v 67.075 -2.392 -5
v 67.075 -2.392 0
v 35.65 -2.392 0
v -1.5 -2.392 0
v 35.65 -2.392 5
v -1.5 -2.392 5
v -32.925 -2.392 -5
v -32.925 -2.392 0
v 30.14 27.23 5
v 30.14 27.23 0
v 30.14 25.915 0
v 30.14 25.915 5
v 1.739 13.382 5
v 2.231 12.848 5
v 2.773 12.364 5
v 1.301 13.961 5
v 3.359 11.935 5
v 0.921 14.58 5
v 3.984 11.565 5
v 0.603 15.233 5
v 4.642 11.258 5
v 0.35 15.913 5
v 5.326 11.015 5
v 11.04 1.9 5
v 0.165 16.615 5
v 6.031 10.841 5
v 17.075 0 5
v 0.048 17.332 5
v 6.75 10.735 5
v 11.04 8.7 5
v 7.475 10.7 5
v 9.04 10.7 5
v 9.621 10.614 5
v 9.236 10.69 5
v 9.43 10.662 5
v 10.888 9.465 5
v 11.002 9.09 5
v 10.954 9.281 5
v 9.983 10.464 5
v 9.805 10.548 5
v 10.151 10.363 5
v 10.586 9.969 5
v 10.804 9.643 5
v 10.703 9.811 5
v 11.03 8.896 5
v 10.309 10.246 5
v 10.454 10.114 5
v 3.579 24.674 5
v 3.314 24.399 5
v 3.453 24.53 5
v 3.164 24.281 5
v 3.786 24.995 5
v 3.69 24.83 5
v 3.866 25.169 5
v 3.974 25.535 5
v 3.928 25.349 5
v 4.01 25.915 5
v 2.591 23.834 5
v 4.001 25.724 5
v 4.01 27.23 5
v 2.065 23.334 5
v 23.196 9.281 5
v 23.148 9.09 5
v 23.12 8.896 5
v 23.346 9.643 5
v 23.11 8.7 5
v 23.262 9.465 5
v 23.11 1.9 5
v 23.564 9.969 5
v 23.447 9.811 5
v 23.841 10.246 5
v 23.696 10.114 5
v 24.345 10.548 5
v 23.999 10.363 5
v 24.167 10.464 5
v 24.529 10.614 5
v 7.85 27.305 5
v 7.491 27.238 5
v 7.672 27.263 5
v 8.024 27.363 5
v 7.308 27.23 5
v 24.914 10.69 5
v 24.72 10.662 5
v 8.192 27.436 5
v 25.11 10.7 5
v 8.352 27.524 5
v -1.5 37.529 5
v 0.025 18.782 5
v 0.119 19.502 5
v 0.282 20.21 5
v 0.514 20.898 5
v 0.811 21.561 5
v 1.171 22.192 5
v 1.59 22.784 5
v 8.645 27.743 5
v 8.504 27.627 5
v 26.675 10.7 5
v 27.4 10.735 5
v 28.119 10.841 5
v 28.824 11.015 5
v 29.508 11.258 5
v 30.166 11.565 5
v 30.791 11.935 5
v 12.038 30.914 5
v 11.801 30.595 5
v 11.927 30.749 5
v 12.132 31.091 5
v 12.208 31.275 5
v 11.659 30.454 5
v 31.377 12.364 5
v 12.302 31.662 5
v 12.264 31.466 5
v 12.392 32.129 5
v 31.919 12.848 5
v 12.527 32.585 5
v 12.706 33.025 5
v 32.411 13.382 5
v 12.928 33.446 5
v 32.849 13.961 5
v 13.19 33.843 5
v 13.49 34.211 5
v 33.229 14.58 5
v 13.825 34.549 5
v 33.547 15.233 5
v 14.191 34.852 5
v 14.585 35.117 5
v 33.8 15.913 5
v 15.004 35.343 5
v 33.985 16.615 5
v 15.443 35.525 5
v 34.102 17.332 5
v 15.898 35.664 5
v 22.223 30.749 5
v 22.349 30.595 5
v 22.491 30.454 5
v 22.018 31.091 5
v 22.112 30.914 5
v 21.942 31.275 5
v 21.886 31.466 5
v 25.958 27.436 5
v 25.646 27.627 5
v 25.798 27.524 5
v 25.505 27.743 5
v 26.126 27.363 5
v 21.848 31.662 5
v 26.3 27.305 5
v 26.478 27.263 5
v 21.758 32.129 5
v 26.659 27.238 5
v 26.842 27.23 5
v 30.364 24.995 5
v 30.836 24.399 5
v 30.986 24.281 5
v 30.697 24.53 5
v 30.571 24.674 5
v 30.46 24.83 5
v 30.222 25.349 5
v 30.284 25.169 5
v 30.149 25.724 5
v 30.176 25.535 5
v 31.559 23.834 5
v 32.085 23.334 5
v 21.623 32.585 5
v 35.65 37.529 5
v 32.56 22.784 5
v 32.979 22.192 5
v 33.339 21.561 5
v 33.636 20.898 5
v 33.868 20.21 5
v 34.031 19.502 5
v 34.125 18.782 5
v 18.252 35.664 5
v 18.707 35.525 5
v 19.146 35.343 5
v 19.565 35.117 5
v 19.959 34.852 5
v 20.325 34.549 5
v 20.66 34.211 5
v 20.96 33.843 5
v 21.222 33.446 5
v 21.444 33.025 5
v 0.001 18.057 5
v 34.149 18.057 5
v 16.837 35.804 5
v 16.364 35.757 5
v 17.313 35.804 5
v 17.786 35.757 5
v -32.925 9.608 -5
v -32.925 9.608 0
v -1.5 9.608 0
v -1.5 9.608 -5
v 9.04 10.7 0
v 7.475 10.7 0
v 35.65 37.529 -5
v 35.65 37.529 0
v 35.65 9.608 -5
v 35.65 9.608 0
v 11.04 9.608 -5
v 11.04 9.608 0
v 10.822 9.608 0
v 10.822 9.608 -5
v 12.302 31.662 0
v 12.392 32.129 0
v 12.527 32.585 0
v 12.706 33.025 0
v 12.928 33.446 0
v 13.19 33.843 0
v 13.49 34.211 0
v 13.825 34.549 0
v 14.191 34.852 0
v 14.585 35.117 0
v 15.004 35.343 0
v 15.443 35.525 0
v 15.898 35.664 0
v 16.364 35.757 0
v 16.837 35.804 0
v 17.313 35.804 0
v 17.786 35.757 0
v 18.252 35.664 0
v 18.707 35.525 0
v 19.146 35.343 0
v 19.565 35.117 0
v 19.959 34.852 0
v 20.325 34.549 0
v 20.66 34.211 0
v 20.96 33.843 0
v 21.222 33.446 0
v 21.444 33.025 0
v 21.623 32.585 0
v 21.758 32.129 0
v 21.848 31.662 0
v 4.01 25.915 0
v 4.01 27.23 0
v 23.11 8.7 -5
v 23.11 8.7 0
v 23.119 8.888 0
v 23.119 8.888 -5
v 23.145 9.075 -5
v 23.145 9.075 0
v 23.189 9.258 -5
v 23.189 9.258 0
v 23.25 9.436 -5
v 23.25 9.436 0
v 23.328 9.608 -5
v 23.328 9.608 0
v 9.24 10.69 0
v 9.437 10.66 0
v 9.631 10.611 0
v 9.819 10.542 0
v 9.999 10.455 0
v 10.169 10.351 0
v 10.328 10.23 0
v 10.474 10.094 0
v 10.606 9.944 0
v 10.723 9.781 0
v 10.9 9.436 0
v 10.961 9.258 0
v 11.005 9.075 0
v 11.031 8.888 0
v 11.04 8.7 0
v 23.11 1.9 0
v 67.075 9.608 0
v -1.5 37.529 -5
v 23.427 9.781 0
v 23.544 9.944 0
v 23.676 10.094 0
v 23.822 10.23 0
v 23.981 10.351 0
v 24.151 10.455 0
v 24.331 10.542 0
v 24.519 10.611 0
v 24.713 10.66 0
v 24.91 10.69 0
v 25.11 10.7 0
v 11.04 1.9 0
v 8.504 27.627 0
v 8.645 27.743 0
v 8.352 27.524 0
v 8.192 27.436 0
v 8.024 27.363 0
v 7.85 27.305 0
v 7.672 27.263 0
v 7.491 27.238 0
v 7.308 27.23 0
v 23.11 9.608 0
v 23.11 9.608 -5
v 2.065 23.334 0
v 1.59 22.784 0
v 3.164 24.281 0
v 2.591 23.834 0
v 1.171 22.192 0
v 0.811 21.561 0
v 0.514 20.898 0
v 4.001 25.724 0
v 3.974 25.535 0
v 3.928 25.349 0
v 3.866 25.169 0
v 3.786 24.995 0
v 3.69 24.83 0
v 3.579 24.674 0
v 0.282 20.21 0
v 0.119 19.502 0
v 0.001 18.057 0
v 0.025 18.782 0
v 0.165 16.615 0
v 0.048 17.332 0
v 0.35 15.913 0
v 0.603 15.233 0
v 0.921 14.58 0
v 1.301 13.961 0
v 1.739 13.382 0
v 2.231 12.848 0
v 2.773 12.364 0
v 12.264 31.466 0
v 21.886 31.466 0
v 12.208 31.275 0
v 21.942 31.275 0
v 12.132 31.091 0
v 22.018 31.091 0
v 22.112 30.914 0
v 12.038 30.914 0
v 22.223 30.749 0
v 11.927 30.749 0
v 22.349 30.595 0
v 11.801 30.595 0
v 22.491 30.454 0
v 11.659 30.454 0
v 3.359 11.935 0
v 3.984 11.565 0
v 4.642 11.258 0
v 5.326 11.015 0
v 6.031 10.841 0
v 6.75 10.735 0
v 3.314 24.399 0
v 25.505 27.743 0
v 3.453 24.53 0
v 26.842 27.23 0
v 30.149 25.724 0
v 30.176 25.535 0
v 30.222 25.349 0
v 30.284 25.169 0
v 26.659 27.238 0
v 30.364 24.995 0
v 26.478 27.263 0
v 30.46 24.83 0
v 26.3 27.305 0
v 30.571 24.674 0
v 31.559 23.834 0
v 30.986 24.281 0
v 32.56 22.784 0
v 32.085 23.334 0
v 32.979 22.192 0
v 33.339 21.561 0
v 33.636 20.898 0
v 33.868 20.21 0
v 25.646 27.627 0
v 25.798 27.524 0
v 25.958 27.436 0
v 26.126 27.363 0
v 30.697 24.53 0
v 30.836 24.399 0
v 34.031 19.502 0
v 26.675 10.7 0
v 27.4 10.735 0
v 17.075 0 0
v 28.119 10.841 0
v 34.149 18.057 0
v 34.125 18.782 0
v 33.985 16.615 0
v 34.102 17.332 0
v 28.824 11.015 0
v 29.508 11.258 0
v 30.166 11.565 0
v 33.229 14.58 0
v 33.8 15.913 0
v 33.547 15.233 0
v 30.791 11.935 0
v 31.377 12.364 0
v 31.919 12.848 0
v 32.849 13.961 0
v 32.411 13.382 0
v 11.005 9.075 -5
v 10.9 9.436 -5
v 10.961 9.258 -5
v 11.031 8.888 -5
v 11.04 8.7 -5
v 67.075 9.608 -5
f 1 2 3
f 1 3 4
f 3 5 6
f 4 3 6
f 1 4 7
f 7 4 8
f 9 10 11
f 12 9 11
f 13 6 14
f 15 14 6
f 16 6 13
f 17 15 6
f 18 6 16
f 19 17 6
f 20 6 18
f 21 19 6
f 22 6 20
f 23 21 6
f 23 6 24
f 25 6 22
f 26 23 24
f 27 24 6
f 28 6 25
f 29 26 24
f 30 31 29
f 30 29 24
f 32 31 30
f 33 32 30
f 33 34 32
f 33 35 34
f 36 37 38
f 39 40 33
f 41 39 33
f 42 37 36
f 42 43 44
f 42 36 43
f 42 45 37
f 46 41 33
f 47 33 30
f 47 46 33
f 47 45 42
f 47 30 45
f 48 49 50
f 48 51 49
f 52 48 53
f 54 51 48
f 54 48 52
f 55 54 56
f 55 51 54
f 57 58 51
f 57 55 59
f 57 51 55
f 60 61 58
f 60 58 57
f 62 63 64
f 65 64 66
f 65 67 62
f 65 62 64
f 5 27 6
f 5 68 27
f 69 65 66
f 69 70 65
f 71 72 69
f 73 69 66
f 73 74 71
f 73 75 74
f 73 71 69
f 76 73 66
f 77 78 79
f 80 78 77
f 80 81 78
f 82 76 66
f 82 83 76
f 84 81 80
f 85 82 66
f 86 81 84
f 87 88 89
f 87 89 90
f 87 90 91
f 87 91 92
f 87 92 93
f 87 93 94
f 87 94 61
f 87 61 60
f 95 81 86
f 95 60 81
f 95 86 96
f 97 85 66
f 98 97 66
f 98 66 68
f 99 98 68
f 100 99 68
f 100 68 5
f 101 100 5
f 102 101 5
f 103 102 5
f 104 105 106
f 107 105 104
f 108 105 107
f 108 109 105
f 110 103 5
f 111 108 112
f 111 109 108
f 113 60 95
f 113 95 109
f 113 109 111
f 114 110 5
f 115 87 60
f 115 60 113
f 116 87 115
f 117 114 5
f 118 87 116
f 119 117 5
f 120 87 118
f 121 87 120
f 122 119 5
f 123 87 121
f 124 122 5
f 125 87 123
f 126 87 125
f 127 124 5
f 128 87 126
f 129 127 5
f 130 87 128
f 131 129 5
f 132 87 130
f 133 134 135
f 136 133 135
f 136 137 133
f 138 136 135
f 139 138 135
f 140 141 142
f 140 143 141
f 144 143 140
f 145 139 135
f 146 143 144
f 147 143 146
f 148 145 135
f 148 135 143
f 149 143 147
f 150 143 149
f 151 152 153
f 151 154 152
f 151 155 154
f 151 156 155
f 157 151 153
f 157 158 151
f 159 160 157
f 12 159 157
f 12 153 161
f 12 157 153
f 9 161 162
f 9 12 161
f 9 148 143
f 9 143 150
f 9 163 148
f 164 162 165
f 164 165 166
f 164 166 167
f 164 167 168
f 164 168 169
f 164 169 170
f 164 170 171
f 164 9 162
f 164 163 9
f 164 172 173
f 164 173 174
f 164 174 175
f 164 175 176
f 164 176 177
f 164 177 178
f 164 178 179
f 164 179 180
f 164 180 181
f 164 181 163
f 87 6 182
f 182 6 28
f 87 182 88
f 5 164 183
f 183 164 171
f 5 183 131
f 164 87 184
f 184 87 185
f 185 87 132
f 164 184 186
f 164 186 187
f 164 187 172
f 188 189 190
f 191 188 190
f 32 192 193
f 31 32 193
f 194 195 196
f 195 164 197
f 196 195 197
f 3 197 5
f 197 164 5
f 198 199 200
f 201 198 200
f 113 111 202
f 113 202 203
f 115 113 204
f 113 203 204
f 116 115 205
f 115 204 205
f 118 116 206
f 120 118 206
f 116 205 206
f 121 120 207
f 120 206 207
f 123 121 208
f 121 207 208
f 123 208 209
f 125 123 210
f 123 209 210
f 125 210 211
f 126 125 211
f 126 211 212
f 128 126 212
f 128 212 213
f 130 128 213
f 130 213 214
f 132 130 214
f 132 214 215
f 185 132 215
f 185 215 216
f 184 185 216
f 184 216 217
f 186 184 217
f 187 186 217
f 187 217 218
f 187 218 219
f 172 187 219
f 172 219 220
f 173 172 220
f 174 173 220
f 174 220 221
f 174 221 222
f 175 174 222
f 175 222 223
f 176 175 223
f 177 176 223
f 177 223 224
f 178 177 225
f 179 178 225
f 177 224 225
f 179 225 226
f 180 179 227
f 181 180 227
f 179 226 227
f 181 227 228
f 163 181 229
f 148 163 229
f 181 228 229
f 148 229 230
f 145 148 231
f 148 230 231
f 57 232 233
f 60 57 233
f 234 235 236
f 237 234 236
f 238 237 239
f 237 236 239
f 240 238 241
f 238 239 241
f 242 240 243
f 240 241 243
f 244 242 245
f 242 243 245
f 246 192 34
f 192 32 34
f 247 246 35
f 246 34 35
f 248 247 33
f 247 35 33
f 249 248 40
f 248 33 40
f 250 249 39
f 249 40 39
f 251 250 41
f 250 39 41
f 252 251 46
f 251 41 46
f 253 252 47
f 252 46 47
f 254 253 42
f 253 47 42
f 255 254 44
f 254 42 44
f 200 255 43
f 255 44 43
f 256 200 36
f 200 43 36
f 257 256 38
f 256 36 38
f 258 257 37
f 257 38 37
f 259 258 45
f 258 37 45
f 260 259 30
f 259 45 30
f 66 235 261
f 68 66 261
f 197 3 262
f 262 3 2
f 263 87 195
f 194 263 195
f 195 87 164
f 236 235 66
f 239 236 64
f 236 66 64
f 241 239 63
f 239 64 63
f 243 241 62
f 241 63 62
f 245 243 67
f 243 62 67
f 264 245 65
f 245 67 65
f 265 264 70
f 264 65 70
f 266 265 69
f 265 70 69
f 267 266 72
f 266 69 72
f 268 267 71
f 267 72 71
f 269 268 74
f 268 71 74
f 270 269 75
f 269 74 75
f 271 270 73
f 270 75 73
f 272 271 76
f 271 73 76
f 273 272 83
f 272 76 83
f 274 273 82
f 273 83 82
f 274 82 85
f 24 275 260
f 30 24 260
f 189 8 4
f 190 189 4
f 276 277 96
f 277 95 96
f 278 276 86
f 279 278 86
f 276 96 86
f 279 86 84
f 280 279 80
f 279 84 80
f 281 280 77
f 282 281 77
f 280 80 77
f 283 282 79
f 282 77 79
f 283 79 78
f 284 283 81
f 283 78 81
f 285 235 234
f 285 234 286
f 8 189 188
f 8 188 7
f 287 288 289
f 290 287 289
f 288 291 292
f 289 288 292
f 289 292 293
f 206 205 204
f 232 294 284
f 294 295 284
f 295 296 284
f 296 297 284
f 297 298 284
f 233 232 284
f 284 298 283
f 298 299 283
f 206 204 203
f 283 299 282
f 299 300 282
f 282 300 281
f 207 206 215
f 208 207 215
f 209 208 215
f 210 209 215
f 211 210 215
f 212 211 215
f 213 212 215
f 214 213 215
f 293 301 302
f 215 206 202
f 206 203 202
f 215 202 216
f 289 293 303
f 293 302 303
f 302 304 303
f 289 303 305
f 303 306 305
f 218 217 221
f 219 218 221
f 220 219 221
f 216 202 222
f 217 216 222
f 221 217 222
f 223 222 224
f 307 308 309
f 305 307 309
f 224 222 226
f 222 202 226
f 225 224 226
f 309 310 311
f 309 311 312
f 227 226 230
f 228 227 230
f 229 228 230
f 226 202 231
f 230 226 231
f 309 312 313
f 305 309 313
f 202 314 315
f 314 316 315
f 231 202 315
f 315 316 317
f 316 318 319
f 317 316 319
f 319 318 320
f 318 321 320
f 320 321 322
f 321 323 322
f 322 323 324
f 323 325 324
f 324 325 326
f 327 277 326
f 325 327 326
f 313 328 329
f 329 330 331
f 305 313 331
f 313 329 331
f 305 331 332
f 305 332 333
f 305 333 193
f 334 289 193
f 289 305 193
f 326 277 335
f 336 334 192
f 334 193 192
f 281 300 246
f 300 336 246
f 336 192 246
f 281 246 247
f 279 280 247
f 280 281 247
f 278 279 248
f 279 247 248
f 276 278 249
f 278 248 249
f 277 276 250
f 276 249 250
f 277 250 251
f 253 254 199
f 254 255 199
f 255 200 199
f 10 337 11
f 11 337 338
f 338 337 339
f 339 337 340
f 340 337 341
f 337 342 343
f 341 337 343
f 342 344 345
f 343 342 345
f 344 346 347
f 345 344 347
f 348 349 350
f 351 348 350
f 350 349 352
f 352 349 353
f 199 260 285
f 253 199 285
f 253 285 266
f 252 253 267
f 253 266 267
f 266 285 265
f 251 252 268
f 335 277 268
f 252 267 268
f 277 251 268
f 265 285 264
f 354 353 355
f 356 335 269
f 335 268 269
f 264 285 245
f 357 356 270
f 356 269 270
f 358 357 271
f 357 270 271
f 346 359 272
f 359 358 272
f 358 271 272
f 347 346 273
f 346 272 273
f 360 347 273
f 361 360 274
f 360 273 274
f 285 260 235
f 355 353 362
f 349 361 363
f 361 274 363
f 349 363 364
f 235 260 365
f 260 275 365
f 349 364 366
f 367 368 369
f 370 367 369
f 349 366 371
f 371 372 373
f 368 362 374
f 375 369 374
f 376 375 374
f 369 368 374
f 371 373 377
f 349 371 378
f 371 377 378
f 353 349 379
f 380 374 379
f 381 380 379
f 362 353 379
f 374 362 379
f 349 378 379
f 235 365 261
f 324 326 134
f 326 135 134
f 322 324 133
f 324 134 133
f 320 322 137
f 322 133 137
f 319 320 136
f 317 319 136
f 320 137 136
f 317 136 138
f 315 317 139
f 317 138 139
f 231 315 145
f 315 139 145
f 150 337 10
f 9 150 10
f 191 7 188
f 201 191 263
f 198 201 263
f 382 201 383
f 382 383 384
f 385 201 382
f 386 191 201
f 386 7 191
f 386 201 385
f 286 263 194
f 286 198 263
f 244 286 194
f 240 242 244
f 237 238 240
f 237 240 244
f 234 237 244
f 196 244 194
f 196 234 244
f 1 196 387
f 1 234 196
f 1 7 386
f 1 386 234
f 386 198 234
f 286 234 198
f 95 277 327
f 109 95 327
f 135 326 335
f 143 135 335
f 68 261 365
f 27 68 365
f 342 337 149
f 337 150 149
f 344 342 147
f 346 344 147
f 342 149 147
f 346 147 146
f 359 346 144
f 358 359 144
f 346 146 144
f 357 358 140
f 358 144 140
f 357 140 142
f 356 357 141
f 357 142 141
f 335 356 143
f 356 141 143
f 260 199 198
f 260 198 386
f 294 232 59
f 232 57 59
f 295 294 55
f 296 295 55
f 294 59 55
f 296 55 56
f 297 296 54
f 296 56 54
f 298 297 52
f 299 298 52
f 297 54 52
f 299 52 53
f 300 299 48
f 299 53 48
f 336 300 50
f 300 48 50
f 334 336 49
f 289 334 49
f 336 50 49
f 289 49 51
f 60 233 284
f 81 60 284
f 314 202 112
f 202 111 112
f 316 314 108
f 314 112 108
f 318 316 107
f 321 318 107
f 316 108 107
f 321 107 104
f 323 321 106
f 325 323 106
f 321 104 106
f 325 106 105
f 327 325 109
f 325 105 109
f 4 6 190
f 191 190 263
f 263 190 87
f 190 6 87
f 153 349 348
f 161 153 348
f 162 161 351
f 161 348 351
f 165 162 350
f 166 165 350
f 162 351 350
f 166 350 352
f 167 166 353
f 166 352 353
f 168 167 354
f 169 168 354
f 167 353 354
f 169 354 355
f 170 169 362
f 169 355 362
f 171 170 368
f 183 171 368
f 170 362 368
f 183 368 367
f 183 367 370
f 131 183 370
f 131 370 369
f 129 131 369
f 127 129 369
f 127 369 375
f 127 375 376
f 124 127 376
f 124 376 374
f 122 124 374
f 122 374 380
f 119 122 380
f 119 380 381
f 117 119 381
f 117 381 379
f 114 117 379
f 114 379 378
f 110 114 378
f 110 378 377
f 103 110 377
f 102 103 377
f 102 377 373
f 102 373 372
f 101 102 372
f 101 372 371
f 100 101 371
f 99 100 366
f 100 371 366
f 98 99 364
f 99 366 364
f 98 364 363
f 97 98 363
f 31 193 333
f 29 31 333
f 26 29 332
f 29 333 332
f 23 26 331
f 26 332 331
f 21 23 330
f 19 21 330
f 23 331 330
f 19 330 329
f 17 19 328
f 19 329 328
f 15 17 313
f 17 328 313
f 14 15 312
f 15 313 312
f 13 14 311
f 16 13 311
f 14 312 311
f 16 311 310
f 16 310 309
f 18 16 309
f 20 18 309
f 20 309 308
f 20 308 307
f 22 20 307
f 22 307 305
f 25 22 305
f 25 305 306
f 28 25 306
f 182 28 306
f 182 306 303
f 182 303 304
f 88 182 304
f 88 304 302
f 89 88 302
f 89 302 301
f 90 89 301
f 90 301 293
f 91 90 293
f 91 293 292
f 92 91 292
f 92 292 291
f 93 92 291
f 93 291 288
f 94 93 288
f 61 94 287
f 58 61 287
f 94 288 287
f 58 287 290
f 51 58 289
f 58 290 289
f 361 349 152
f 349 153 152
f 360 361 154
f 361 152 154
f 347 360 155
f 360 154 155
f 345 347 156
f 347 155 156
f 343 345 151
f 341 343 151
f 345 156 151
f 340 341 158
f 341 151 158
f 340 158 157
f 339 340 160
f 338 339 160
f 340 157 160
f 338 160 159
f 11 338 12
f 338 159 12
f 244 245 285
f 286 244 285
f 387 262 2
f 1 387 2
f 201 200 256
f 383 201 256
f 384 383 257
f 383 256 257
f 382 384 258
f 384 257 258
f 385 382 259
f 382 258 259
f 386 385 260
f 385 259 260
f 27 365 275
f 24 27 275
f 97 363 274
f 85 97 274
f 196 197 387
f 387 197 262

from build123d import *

# Parameters (mm, degrees)
F1_W     = 37.15
F1_H     = 39.9213461205
F2_DEPTH = 5
F3_R     = 2
F4_W     = 31.425
F4_H     = 12
F5_DEPTH = 5
F7_DEPTH = 5


with BuildPart() as f2:
    # F1 (on Top) → F2 (new body)
    with BuildSketch(Plane.XY):
        with Locations((17.075, 17.5686092116)):
            Rectangle(F1_W, F1_H)
        with BuildLine():
            ThreePointArc((7.475, 10.7), (0.2160219573, 16.3909420481), (4.01, 24.7983979195))
            Line((4.01, 24.7983979195), (4.01, 27.23))
            Line((4.01, 27.23), (8.075, 27.23))
            Line((8.075, 27.23), (12.255, 30.99))
            ThreePointArc((12.255, 30.99), (17.075, 35.81), (21.895, 30.99))
            Line((21.895, 30.99), (26.075, 27.23))
            Line((26.075, 27.23), (30.14, 27.23))
            Line((30.14, 27.23), (30.14, 24.7983979195))
            ThreePointArc((30.14, 24.7983979195), (33.9339780427, 16.3909420481), (26.675, 10.7))
            Line((26.675, 10.7), (23.11, 10.7))
            Line((23.11, 10.7), (23.11, 1.9))
            Line((23.11, 1.9), (17.075, 0))
            Line((17.075, 0), (11.04, 1.9))
            Line((11.04, 1.9), (11.04, 10.7))
            Line((11.04, 10.7), (7.475, 10.7))
        make_face(mode=Mode.SUBTRACT)
    extrude(amount=F2_DEPTH)

    # F3
    f3_edges = [f2.edges().sort_by_distance(p)[0] for p in [
        (8.075, 27.23, 2.5),
        (12.255, 30.99, 2.5),
        (21.895, 30.99, 2.5),
        (26.075, 27.23, 2.5),
        (30.14, 24.798398, 2.5),
        (4.01, 24.798398, 2.5),
        (11.04, 10.7, 2.5),
        (23.11, 10.7, 2.5),
    ]]
    fillet(f3_edges, radius=F3_R)

    # F4 (on face) + F0 (on Top) → F5 (join)
    with BuildSketch(Plane(origin=(0, 0, 0), x_dir=(1, 0, 0), z_dir=(0, 0, -1))):
        with Locations((-17.2125, -3.6079361513)):
            Rectangle(F4_W, F4_H)
        with Locations((51.3625, -3.6079361513)):
            Rectangle(F4_W, F4_H)
        with BuildLine():
            Line((23.3279641011, -9.6079361513), (35.65, -9.6079361513))
            Line((35.65, -9.6079361513), (35.65, 2.3920638487))
            Line((35.65, 2.3920638487), (-1.5, 2.3920638487))
            Line((-1.5, 2.3920638487), (-1.5, -9.6079361513))
            Line((-1.5, -9.6079361513), (10.8220358989, -9.6079361513))
            ThreePointArc((10.8220358989, -9.6079361513), (10.9847457158, -9.1668662561), (11.04, -8.7))
            Line((11.04, -8.7), (11.04, -1.9))
            Line((11.04, -1.9), (17.075, 0))
            Line((17.075, 0), (23.11, -1.9))
            Line((23.11, -1.9), (23.11, -8.7))
            ThreePointArc((23.11, -8.7), (23.1652542842, -9.1668662561), (23.3279641011, -9.6079361513))
        make_face()
    with BuildSketch(Plane.XY):
        Polygon((11.04, 1.9), (17.075, 0), (17.075, 10.7), (11.04, 10.7), align=None)
        Polygon((17.075, 10.7), (17.075, 0), (23.11, 1.9), (23.11, 10.7), align=None)
    extrude(amount=F5_DEPTH, dir=(0, 0, -1))

    # F6 (on face) → F7 (join)
    with BuildSketch(Plane(origin=(0, 0, 0), x_dir=(1, 0, 0), z_dir=(0, 0, -1))):
        with BuildLine():
            Line((-1.5, -37.5292822719), (35.65, -37.5292822719))
            Line((35.65, -37.5292822719), (35.65, -9.6079361513))
            Line((35.65, -9.6079361513), (23.3279641011, -9.6079361513))
            ThreePointArc((23.3279641011, -9.6079361513), (24.0649814123, -10.4052671789), (25.11, -10.7))
            Line((25.11, -10.7), (26.675, -10.7))
            ThreePointArc((26.675, -10.7), (33.7996177752, -15.9132647022), (30.9864379947, -24.2813186469))
            ThreePointArc((30.9864379947, -24.2813186469), (30.3641728673, -24.9950956291), (30.14, -25.9151162782))
            Line((30.14, -25.9151162782), (30.14, -27.23))
            Line((30.14, -27.23), (26.8421686802, -27.23))
            ThreePointArc((26.8421686802, -27.23), (26.125888011, -27.3626644643), (25.504632333, -27.7430579971))
            Line((25.504632333, -27.7430579971), (22.4908367694, -30.4540319969))
            ThreePointArc((22.4908367694, -30.4540319969), (22.0628330313, -31.0013633318), (21.8479117921, -31.662095994))
            ThreePointArc((21.8479117921, -31.662095994), (17.075, -35.81), (12.3020882079, -31.662095994))
            ThreePointArc((12.3020882079, -31.662095994), (12.0871669687, -31.0013633318), (11.6591632306, -30.4540319969))
            Line((11.6591632306, -30.4540319969), (8.645367667, -27.7430579971))
            ThreePointArc((8.645367667, -27.7430579971), (8.024111989, -27.3626644643), (7.3078313198, -27.23))
            Line((7.3078313198, -27.23), (4.01, -27.23))
            Line((4.01, -27.23), (4.01, -25.9151162782))
            ThreePointArc((4.01, -25.9151162782), (3.7858271327, -24.9950956291), (3.1635620053, -24.2813186469))
            ThreePointArc((3.1635620053, -24.2813186469), (0.3503822248, -15.9132647022), (7.475, -10.7))
            Line((7.475, -10.7), (9.04, -10.7))
            ThreePointArc((9.04, -10.7), (10.0850185877, -10.4052671789), (10.8220358989, -9.6079361513))
            Line((10.8220358989, -9.6079361513), (-1.5, -9.6079361513))
            Line((-1.5, -9.6079361513), (-1.5, -37.5292822719))
        make_face()
        with BuildLine():
            ThreePointArc((25.11, -10.7), (24.0649814123, -10.4052671789), (23.3279641011, -9.6079361513))
            Line((23.3279641011, -9.6079361513), (10.8220358989, -9.6079361513))
            ThreePointArc((10.8220358989, -9.6079361513), (10.0850185877, -10.4052671789), (9.04, -10.7))
            Line((9.04, -10.7), (7.475, -10.7))
            ThreePointArc((7.475, -10.7), (0.3503822248, -15.9132647022), (3.1635620053, -24.2813186469))
            ThreePointArc((3.1635620053, -24.2813186469), (3.7858271327, -24.9950956291), (4.01, -25.9151162782))
            Line((4.01, -25.9151162782), (4.01, -27.23))
            Line((4.01, -27.23), (7.3078313198, -27.23))
            ThreePointArc((7.3078313198, -27.23), (8.024111989, -27.3626644643), (8.645367667, -27.7430579971))
            Line((8.645367667, -27.7430579971), (11.6591632306, -30.4540319969))
            ThreePointArc((11.6591632306, -30.4540319969), (12.0871669687, -31.0013633318), (12.3020882079, -31.662095994))
            ThreePointArc((12.3020882079, -31.662095994), (17.075, -35.81), (21.8479117921, -31.662095994))
            ThreePointArc((21.8479117921, -31.662095994), (22.0628330313, -31.0013633318), (22.4908367694, -30.4540319969))
            Line((22.4908367694, -30.4540319969), (25.504632333, -27.7430579971))
            ThreePointArc((25.504632333, -27.7430579971), (26.125888011, -27.3626644643), (26.8421686802, -27.23))
            Line((26.8421686802, -27.23), (30.14, -27.23))
            Line((30.14, -27.23), (30.14, -25.9151162782))
            ThreePointArc((30.14, -25.9151162782), (30.3641728673, -24.9950956291), (30.9864379947, -24.2813186469))
            ThreePointArc((30.9864379947, -24.2813186469), (33.7996177752, -15.9132647022), (26.675, -10.7))
            Line((26.675, -10.7), (25.11, -10.7))
        make_face()
    extrude(amount=F7_DEPTH)


solid = f2.part
